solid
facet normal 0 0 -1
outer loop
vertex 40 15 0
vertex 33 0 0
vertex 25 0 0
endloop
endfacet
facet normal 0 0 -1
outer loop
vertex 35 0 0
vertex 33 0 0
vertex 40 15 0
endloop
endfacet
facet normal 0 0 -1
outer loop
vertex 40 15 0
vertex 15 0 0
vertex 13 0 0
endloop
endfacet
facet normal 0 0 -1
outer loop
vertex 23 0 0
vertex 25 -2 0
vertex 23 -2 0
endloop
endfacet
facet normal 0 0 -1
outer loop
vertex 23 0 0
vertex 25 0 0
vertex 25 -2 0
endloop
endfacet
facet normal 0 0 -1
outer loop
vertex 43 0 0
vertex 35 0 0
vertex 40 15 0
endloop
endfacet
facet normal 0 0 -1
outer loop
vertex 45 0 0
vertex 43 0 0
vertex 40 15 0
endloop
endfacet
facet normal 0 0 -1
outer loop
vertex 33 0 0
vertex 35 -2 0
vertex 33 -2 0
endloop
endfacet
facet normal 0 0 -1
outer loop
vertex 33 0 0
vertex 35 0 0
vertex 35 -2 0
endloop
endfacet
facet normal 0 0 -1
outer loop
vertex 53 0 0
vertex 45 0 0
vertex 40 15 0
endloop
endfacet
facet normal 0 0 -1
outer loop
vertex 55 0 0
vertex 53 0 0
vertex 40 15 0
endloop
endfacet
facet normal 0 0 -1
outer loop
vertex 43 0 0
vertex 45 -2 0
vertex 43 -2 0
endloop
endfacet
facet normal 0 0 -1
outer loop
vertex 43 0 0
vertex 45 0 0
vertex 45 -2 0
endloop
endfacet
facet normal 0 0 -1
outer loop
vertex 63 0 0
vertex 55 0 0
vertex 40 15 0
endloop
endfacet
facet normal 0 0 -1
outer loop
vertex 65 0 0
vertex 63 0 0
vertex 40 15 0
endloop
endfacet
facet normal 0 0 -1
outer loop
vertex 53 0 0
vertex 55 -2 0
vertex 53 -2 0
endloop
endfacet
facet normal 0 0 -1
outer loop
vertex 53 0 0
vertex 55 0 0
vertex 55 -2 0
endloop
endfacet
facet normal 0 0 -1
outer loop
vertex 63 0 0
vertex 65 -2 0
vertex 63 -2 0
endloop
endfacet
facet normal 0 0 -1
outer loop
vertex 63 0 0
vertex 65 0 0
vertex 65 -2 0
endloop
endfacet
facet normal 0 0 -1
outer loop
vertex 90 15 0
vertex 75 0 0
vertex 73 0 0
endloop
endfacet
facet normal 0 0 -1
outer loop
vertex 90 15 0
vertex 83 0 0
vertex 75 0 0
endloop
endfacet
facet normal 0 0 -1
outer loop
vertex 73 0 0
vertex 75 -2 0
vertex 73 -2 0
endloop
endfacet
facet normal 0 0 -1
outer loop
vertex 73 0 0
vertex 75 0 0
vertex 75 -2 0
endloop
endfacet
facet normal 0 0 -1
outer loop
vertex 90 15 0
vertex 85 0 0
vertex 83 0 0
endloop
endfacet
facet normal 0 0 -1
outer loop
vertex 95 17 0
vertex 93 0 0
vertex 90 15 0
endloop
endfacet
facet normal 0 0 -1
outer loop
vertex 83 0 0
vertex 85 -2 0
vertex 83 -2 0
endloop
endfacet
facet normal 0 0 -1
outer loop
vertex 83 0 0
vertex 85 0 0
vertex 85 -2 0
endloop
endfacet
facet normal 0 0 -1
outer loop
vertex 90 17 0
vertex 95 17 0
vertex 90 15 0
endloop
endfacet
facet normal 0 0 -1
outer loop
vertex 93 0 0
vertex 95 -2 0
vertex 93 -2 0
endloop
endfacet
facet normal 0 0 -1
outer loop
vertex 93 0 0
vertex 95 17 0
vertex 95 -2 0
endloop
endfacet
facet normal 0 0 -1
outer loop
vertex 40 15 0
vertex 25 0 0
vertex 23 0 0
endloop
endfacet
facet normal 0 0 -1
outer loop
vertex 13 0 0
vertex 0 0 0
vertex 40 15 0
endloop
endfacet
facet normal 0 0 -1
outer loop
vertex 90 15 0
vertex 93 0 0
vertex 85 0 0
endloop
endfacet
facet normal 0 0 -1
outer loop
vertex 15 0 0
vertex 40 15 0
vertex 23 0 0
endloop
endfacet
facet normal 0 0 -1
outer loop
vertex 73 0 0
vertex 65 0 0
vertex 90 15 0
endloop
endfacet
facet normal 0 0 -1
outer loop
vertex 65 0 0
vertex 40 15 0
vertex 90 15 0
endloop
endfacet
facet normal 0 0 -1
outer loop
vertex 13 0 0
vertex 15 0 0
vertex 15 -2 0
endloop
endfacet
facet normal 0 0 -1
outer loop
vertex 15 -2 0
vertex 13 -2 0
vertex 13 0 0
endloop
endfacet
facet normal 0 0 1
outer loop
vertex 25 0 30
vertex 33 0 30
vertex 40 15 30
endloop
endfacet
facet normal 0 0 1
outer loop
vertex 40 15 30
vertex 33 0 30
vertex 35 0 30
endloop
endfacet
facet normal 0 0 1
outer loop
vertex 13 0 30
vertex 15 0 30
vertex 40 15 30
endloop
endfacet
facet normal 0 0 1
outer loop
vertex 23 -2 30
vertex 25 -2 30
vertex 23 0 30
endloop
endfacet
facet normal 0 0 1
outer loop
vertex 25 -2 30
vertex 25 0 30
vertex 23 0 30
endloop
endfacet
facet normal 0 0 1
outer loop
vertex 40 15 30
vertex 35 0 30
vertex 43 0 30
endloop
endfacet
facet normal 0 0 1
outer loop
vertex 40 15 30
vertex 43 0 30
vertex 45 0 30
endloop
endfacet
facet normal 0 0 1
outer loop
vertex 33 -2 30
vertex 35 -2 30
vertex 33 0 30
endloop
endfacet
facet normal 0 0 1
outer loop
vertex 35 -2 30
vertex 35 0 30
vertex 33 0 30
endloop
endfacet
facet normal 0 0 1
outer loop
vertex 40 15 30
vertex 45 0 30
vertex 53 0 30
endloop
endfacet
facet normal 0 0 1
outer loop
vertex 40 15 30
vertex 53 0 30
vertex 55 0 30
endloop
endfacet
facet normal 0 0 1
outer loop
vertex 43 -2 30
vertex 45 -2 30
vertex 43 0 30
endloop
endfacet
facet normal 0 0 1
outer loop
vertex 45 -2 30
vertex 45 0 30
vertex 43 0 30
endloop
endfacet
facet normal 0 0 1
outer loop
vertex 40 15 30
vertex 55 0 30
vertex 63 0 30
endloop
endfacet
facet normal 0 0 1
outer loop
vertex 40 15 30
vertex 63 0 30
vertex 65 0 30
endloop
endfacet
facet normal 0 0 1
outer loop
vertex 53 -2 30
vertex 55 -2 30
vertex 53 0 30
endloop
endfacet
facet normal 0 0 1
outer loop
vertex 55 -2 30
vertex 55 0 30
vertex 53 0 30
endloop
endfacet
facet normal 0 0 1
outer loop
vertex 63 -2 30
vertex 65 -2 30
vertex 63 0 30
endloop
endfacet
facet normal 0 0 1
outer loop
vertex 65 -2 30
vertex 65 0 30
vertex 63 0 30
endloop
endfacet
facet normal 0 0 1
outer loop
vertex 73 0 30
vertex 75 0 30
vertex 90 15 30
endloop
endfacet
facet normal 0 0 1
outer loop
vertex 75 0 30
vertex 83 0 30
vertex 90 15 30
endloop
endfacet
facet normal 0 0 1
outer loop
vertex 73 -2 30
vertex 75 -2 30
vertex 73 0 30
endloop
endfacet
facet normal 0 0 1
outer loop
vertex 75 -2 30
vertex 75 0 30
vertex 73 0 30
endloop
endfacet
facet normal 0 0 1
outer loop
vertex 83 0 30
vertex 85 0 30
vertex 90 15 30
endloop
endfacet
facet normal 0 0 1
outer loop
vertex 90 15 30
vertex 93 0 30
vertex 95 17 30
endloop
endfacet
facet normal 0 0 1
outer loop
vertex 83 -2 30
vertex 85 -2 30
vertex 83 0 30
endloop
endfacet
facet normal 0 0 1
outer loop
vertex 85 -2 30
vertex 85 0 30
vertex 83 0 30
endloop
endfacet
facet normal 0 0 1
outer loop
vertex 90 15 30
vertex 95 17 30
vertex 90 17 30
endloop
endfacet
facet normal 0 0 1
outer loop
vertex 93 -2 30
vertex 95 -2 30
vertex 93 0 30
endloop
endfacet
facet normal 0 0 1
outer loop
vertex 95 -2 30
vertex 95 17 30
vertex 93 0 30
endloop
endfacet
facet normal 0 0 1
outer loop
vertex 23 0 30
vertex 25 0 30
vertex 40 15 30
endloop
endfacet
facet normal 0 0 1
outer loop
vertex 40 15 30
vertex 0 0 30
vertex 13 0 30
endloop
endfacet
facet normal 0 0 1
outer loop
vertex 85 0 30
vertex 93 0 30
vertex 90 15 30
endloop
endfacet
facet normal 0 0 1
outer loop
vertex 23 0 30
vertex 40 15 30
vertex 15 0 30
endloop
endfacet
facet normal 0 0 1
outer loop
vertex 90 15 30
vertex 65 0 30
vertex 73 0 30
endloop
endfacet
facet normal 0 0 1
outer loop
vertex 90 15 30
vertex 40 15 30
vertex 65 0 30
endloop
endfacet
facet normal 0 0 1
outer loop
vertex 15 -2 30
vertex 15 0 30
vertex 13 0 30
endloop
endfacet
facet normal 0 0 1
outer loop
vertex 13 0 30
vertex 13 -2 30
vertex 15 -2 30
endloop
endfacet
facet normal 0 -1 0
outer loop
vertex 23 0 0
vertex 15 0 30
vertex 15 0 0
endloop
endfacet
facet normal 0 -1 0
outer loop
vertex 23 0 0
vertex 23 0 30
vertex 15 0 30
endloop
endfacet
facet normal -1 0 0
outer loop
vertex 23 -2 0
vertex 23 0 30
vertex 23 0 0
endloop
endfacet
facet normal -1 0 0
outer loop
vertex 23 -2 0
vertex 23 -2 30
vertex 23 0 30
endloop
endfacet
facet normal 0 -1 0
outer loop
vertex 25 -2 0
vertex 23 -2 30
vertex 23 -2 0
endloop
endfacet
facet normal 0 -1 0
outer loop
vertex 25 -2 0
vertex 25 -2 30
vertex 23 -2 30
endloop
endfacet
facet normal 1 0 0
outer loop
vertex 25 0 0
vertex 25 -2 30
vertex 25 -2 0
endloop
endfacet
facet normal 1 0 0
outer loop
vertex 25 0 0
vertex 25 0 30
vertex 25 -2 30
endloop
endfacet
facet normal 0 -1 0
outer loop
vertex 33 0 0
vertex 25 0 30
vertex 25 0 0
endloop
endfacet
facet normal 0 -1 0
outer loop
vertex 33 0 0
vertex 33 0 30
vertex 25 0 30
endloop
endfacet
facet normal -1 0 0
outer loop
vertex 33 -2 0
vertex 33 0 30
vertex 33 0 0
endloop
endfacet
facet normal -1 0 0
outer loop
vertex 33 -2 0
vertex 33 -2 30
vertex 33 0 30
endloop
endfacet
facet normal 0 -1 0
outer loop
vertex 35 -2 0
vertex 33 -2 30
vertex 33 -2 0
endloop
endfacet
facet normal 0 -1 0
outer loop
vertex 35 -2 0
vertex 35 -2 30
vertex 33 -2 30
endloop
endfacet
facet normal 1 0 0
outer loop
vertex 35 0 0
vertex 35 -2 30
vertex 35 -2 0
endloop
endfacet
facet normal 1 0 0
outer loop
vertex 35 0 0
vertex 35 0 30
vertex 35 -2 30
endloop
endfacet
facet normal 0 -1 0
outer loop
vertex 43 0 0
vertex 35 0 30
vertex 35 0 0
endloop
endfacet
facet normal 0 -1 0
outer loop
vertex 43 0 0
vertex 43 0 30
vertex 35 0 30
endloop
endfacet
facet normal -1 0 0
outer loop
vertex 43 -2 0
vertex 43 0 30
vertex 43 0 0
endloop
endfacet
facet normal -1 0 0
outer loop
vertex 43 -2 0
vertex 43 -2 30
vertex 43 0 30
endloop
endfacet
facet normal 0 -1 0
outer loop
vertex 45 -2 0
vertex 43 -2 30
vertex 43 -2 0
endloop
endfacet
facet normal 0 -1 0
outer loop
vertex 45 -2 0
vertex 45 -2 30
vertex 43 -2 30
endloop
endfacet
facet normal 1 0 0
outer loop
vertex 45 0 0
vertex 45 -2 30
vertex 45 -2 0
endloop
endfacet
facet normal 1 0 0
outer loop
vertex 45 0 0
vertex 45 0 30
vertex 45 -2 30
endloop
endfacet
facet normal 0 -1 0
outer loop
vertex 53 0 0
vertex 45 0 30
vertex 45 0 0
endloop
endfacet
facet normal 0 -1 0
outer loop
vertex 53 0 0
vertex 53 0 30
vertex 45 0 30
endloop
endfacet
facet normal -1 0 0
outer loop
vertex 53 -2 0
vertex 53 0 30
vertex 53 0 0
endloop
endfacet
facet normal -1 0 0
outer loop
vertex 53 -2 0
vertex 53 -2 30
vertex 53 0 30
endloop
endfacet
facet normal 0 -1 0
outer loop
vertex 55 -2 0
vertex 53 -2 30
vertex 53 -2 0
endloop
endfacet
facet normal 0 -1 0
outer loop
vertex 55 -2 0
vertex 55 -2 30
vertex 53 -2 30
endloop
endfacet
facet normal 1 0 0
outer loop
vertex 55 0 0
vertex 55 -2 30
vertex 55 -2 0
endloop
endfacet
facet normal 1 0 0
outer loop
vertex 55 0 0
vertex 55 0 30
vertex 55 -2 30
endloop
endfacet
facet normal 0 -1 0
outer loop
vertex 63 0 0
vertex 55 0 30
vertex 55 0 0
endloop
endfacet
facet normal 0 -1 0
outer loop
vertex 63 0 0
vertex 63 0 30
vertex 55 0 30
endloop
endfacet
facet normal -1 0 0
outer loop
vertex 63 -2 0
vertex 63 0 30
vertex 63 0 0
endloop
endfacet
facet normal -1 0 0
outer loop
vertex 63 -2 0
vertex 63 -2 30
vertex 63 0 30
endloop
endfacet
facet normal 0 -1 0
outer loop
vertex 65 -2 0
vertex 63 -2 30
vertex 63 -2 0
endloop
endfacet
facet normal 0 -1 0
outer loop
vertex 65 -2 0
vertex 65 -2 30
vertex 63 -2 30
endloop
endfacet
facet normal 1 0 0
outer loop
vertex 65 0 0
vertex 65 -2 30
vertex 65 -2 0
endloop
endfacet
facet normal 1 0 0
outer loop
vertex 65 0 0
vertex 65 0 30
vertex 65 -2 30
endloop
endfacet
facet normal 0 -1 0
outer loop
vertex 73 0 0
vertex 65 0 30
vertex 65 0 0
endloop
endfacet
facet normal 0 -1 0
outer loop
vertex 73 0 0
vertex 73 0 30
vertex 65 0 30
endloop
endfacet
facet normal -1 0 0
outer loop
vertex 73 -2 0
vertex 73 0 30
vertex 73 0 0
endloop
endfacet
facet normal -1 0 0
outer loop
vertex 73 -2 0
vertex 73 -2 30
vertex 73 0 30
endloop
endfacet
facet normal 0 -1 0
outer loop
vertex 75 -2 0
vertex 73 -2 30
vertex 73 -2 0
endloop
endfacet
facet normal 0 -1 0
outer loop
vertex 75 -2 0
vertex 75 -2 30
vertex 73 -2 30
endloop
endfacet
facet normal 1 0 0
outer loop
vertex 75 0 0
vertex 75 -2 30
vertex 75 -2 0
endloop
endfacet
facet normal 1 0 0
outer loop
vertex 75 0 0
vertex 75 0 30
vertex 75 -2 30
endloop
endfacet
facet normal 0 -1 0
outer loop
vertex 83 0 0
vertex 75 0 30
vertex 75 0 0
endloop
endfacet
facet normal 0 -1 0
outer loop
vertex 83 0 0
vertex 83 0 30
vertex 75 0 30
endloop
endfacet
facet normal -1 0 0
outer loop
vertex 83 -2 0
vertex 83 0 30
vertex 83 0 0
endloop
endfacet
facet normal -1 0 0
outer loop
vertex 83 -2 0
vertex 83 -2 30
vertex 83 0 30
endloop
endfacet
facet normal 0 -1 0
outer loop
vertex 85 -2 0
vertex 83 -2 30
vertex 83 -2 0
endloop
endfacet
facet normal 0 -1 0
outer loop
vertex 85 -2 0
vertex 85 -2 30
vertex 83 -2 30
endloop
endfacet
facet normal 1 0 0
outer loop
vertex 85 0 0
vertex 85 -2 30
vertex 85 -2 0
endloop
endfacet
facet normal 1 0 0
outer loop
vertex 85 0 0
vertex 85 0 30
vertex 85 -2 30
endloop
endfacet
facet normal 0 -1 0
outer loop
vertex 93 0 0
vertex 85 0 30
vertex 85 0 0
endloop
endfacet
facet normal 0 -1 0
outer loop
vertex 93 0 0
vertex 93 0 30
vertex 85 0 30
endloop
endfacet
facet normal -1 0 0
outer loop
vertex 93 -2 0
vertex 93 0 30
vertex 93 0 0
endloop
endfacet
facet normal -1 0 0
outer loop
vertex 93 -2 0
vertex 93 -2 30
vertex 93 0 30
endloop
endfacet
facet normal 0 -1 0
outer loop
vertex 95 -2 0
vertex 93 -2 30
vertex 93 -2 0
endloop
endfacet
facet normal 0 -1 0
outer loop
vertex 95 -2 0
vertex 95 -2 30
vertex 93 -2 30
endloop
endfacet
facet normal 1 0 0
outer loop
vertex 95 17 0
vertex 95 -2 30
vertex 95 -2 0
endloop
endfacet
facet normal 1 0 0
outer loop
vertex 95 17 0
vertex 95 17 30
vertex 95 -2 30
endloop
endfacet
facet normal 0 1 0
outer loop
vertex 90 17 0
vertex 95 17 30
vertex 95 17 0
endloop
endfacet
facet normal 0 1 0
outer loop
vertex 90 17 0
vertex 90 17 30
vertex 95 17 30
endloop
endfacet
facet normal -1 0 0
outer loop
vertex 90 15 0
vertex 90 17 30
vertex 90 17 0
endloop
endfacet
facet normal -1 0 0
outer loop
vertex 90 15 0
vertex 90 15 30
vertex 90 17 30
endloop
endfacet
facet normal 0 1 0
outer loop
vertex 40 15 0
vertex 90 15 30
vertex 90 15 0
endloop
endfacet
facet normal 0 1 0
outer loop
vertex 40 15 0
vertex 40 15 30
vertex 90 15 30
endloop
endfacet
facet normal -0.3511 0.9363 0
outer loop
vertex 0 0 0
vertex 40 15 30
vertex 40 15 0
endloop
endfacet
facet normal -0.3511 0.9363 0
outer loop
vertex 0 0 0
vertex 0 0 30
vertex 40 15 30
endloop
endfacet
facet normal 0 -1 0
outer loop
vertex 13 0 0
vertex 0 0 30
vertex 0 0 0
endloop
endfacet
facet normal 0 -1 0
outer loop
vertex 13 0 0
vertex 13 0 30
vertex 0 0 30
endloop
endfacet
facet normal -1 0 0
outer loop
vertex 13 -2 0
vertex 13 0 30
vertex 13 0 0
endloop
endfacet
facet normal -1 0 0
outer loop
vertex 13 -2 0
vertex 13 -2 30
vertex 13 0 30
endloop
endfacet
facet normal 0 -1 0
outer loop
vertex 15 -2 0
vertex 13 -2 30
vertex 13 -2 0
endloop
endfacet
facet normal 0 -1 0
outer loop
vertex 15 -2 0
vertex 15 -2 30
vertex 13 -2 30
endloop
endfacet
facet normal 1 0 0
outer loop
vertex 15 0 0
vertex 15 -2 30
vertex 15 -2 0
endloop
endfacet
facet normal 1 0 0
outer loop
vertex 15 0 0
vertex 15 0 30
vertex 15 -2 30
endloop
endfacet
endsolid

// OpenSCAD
height = 15;

linear_extrude(30) {
    polygon([
        [0,0],[40,height],
        [90,height],[90,height + 2],[95,height + 2],
        [95,-2],
        [93,-2],[93,0],[85,0],[85,-2],
        [83,-2], [83,0], [75,0], [75,-2],
        [73,-2], [73,0], [65,0], [65,-2],
        [63,-2], [63,0], [55,0], [55,-2],
        [53,-2], [53,0], [45,0], [45,-2],
        [43,-2], [43,0], [35,0], [35,-2],
        [33,-2], [33,0], [25,0], [25,-2],
        [23,-2], [23,0], [15,0], [15,-2],
        [13,-2], [13,0], [5,0], [5,-2],
        [5,0]
        
    ]);
}
